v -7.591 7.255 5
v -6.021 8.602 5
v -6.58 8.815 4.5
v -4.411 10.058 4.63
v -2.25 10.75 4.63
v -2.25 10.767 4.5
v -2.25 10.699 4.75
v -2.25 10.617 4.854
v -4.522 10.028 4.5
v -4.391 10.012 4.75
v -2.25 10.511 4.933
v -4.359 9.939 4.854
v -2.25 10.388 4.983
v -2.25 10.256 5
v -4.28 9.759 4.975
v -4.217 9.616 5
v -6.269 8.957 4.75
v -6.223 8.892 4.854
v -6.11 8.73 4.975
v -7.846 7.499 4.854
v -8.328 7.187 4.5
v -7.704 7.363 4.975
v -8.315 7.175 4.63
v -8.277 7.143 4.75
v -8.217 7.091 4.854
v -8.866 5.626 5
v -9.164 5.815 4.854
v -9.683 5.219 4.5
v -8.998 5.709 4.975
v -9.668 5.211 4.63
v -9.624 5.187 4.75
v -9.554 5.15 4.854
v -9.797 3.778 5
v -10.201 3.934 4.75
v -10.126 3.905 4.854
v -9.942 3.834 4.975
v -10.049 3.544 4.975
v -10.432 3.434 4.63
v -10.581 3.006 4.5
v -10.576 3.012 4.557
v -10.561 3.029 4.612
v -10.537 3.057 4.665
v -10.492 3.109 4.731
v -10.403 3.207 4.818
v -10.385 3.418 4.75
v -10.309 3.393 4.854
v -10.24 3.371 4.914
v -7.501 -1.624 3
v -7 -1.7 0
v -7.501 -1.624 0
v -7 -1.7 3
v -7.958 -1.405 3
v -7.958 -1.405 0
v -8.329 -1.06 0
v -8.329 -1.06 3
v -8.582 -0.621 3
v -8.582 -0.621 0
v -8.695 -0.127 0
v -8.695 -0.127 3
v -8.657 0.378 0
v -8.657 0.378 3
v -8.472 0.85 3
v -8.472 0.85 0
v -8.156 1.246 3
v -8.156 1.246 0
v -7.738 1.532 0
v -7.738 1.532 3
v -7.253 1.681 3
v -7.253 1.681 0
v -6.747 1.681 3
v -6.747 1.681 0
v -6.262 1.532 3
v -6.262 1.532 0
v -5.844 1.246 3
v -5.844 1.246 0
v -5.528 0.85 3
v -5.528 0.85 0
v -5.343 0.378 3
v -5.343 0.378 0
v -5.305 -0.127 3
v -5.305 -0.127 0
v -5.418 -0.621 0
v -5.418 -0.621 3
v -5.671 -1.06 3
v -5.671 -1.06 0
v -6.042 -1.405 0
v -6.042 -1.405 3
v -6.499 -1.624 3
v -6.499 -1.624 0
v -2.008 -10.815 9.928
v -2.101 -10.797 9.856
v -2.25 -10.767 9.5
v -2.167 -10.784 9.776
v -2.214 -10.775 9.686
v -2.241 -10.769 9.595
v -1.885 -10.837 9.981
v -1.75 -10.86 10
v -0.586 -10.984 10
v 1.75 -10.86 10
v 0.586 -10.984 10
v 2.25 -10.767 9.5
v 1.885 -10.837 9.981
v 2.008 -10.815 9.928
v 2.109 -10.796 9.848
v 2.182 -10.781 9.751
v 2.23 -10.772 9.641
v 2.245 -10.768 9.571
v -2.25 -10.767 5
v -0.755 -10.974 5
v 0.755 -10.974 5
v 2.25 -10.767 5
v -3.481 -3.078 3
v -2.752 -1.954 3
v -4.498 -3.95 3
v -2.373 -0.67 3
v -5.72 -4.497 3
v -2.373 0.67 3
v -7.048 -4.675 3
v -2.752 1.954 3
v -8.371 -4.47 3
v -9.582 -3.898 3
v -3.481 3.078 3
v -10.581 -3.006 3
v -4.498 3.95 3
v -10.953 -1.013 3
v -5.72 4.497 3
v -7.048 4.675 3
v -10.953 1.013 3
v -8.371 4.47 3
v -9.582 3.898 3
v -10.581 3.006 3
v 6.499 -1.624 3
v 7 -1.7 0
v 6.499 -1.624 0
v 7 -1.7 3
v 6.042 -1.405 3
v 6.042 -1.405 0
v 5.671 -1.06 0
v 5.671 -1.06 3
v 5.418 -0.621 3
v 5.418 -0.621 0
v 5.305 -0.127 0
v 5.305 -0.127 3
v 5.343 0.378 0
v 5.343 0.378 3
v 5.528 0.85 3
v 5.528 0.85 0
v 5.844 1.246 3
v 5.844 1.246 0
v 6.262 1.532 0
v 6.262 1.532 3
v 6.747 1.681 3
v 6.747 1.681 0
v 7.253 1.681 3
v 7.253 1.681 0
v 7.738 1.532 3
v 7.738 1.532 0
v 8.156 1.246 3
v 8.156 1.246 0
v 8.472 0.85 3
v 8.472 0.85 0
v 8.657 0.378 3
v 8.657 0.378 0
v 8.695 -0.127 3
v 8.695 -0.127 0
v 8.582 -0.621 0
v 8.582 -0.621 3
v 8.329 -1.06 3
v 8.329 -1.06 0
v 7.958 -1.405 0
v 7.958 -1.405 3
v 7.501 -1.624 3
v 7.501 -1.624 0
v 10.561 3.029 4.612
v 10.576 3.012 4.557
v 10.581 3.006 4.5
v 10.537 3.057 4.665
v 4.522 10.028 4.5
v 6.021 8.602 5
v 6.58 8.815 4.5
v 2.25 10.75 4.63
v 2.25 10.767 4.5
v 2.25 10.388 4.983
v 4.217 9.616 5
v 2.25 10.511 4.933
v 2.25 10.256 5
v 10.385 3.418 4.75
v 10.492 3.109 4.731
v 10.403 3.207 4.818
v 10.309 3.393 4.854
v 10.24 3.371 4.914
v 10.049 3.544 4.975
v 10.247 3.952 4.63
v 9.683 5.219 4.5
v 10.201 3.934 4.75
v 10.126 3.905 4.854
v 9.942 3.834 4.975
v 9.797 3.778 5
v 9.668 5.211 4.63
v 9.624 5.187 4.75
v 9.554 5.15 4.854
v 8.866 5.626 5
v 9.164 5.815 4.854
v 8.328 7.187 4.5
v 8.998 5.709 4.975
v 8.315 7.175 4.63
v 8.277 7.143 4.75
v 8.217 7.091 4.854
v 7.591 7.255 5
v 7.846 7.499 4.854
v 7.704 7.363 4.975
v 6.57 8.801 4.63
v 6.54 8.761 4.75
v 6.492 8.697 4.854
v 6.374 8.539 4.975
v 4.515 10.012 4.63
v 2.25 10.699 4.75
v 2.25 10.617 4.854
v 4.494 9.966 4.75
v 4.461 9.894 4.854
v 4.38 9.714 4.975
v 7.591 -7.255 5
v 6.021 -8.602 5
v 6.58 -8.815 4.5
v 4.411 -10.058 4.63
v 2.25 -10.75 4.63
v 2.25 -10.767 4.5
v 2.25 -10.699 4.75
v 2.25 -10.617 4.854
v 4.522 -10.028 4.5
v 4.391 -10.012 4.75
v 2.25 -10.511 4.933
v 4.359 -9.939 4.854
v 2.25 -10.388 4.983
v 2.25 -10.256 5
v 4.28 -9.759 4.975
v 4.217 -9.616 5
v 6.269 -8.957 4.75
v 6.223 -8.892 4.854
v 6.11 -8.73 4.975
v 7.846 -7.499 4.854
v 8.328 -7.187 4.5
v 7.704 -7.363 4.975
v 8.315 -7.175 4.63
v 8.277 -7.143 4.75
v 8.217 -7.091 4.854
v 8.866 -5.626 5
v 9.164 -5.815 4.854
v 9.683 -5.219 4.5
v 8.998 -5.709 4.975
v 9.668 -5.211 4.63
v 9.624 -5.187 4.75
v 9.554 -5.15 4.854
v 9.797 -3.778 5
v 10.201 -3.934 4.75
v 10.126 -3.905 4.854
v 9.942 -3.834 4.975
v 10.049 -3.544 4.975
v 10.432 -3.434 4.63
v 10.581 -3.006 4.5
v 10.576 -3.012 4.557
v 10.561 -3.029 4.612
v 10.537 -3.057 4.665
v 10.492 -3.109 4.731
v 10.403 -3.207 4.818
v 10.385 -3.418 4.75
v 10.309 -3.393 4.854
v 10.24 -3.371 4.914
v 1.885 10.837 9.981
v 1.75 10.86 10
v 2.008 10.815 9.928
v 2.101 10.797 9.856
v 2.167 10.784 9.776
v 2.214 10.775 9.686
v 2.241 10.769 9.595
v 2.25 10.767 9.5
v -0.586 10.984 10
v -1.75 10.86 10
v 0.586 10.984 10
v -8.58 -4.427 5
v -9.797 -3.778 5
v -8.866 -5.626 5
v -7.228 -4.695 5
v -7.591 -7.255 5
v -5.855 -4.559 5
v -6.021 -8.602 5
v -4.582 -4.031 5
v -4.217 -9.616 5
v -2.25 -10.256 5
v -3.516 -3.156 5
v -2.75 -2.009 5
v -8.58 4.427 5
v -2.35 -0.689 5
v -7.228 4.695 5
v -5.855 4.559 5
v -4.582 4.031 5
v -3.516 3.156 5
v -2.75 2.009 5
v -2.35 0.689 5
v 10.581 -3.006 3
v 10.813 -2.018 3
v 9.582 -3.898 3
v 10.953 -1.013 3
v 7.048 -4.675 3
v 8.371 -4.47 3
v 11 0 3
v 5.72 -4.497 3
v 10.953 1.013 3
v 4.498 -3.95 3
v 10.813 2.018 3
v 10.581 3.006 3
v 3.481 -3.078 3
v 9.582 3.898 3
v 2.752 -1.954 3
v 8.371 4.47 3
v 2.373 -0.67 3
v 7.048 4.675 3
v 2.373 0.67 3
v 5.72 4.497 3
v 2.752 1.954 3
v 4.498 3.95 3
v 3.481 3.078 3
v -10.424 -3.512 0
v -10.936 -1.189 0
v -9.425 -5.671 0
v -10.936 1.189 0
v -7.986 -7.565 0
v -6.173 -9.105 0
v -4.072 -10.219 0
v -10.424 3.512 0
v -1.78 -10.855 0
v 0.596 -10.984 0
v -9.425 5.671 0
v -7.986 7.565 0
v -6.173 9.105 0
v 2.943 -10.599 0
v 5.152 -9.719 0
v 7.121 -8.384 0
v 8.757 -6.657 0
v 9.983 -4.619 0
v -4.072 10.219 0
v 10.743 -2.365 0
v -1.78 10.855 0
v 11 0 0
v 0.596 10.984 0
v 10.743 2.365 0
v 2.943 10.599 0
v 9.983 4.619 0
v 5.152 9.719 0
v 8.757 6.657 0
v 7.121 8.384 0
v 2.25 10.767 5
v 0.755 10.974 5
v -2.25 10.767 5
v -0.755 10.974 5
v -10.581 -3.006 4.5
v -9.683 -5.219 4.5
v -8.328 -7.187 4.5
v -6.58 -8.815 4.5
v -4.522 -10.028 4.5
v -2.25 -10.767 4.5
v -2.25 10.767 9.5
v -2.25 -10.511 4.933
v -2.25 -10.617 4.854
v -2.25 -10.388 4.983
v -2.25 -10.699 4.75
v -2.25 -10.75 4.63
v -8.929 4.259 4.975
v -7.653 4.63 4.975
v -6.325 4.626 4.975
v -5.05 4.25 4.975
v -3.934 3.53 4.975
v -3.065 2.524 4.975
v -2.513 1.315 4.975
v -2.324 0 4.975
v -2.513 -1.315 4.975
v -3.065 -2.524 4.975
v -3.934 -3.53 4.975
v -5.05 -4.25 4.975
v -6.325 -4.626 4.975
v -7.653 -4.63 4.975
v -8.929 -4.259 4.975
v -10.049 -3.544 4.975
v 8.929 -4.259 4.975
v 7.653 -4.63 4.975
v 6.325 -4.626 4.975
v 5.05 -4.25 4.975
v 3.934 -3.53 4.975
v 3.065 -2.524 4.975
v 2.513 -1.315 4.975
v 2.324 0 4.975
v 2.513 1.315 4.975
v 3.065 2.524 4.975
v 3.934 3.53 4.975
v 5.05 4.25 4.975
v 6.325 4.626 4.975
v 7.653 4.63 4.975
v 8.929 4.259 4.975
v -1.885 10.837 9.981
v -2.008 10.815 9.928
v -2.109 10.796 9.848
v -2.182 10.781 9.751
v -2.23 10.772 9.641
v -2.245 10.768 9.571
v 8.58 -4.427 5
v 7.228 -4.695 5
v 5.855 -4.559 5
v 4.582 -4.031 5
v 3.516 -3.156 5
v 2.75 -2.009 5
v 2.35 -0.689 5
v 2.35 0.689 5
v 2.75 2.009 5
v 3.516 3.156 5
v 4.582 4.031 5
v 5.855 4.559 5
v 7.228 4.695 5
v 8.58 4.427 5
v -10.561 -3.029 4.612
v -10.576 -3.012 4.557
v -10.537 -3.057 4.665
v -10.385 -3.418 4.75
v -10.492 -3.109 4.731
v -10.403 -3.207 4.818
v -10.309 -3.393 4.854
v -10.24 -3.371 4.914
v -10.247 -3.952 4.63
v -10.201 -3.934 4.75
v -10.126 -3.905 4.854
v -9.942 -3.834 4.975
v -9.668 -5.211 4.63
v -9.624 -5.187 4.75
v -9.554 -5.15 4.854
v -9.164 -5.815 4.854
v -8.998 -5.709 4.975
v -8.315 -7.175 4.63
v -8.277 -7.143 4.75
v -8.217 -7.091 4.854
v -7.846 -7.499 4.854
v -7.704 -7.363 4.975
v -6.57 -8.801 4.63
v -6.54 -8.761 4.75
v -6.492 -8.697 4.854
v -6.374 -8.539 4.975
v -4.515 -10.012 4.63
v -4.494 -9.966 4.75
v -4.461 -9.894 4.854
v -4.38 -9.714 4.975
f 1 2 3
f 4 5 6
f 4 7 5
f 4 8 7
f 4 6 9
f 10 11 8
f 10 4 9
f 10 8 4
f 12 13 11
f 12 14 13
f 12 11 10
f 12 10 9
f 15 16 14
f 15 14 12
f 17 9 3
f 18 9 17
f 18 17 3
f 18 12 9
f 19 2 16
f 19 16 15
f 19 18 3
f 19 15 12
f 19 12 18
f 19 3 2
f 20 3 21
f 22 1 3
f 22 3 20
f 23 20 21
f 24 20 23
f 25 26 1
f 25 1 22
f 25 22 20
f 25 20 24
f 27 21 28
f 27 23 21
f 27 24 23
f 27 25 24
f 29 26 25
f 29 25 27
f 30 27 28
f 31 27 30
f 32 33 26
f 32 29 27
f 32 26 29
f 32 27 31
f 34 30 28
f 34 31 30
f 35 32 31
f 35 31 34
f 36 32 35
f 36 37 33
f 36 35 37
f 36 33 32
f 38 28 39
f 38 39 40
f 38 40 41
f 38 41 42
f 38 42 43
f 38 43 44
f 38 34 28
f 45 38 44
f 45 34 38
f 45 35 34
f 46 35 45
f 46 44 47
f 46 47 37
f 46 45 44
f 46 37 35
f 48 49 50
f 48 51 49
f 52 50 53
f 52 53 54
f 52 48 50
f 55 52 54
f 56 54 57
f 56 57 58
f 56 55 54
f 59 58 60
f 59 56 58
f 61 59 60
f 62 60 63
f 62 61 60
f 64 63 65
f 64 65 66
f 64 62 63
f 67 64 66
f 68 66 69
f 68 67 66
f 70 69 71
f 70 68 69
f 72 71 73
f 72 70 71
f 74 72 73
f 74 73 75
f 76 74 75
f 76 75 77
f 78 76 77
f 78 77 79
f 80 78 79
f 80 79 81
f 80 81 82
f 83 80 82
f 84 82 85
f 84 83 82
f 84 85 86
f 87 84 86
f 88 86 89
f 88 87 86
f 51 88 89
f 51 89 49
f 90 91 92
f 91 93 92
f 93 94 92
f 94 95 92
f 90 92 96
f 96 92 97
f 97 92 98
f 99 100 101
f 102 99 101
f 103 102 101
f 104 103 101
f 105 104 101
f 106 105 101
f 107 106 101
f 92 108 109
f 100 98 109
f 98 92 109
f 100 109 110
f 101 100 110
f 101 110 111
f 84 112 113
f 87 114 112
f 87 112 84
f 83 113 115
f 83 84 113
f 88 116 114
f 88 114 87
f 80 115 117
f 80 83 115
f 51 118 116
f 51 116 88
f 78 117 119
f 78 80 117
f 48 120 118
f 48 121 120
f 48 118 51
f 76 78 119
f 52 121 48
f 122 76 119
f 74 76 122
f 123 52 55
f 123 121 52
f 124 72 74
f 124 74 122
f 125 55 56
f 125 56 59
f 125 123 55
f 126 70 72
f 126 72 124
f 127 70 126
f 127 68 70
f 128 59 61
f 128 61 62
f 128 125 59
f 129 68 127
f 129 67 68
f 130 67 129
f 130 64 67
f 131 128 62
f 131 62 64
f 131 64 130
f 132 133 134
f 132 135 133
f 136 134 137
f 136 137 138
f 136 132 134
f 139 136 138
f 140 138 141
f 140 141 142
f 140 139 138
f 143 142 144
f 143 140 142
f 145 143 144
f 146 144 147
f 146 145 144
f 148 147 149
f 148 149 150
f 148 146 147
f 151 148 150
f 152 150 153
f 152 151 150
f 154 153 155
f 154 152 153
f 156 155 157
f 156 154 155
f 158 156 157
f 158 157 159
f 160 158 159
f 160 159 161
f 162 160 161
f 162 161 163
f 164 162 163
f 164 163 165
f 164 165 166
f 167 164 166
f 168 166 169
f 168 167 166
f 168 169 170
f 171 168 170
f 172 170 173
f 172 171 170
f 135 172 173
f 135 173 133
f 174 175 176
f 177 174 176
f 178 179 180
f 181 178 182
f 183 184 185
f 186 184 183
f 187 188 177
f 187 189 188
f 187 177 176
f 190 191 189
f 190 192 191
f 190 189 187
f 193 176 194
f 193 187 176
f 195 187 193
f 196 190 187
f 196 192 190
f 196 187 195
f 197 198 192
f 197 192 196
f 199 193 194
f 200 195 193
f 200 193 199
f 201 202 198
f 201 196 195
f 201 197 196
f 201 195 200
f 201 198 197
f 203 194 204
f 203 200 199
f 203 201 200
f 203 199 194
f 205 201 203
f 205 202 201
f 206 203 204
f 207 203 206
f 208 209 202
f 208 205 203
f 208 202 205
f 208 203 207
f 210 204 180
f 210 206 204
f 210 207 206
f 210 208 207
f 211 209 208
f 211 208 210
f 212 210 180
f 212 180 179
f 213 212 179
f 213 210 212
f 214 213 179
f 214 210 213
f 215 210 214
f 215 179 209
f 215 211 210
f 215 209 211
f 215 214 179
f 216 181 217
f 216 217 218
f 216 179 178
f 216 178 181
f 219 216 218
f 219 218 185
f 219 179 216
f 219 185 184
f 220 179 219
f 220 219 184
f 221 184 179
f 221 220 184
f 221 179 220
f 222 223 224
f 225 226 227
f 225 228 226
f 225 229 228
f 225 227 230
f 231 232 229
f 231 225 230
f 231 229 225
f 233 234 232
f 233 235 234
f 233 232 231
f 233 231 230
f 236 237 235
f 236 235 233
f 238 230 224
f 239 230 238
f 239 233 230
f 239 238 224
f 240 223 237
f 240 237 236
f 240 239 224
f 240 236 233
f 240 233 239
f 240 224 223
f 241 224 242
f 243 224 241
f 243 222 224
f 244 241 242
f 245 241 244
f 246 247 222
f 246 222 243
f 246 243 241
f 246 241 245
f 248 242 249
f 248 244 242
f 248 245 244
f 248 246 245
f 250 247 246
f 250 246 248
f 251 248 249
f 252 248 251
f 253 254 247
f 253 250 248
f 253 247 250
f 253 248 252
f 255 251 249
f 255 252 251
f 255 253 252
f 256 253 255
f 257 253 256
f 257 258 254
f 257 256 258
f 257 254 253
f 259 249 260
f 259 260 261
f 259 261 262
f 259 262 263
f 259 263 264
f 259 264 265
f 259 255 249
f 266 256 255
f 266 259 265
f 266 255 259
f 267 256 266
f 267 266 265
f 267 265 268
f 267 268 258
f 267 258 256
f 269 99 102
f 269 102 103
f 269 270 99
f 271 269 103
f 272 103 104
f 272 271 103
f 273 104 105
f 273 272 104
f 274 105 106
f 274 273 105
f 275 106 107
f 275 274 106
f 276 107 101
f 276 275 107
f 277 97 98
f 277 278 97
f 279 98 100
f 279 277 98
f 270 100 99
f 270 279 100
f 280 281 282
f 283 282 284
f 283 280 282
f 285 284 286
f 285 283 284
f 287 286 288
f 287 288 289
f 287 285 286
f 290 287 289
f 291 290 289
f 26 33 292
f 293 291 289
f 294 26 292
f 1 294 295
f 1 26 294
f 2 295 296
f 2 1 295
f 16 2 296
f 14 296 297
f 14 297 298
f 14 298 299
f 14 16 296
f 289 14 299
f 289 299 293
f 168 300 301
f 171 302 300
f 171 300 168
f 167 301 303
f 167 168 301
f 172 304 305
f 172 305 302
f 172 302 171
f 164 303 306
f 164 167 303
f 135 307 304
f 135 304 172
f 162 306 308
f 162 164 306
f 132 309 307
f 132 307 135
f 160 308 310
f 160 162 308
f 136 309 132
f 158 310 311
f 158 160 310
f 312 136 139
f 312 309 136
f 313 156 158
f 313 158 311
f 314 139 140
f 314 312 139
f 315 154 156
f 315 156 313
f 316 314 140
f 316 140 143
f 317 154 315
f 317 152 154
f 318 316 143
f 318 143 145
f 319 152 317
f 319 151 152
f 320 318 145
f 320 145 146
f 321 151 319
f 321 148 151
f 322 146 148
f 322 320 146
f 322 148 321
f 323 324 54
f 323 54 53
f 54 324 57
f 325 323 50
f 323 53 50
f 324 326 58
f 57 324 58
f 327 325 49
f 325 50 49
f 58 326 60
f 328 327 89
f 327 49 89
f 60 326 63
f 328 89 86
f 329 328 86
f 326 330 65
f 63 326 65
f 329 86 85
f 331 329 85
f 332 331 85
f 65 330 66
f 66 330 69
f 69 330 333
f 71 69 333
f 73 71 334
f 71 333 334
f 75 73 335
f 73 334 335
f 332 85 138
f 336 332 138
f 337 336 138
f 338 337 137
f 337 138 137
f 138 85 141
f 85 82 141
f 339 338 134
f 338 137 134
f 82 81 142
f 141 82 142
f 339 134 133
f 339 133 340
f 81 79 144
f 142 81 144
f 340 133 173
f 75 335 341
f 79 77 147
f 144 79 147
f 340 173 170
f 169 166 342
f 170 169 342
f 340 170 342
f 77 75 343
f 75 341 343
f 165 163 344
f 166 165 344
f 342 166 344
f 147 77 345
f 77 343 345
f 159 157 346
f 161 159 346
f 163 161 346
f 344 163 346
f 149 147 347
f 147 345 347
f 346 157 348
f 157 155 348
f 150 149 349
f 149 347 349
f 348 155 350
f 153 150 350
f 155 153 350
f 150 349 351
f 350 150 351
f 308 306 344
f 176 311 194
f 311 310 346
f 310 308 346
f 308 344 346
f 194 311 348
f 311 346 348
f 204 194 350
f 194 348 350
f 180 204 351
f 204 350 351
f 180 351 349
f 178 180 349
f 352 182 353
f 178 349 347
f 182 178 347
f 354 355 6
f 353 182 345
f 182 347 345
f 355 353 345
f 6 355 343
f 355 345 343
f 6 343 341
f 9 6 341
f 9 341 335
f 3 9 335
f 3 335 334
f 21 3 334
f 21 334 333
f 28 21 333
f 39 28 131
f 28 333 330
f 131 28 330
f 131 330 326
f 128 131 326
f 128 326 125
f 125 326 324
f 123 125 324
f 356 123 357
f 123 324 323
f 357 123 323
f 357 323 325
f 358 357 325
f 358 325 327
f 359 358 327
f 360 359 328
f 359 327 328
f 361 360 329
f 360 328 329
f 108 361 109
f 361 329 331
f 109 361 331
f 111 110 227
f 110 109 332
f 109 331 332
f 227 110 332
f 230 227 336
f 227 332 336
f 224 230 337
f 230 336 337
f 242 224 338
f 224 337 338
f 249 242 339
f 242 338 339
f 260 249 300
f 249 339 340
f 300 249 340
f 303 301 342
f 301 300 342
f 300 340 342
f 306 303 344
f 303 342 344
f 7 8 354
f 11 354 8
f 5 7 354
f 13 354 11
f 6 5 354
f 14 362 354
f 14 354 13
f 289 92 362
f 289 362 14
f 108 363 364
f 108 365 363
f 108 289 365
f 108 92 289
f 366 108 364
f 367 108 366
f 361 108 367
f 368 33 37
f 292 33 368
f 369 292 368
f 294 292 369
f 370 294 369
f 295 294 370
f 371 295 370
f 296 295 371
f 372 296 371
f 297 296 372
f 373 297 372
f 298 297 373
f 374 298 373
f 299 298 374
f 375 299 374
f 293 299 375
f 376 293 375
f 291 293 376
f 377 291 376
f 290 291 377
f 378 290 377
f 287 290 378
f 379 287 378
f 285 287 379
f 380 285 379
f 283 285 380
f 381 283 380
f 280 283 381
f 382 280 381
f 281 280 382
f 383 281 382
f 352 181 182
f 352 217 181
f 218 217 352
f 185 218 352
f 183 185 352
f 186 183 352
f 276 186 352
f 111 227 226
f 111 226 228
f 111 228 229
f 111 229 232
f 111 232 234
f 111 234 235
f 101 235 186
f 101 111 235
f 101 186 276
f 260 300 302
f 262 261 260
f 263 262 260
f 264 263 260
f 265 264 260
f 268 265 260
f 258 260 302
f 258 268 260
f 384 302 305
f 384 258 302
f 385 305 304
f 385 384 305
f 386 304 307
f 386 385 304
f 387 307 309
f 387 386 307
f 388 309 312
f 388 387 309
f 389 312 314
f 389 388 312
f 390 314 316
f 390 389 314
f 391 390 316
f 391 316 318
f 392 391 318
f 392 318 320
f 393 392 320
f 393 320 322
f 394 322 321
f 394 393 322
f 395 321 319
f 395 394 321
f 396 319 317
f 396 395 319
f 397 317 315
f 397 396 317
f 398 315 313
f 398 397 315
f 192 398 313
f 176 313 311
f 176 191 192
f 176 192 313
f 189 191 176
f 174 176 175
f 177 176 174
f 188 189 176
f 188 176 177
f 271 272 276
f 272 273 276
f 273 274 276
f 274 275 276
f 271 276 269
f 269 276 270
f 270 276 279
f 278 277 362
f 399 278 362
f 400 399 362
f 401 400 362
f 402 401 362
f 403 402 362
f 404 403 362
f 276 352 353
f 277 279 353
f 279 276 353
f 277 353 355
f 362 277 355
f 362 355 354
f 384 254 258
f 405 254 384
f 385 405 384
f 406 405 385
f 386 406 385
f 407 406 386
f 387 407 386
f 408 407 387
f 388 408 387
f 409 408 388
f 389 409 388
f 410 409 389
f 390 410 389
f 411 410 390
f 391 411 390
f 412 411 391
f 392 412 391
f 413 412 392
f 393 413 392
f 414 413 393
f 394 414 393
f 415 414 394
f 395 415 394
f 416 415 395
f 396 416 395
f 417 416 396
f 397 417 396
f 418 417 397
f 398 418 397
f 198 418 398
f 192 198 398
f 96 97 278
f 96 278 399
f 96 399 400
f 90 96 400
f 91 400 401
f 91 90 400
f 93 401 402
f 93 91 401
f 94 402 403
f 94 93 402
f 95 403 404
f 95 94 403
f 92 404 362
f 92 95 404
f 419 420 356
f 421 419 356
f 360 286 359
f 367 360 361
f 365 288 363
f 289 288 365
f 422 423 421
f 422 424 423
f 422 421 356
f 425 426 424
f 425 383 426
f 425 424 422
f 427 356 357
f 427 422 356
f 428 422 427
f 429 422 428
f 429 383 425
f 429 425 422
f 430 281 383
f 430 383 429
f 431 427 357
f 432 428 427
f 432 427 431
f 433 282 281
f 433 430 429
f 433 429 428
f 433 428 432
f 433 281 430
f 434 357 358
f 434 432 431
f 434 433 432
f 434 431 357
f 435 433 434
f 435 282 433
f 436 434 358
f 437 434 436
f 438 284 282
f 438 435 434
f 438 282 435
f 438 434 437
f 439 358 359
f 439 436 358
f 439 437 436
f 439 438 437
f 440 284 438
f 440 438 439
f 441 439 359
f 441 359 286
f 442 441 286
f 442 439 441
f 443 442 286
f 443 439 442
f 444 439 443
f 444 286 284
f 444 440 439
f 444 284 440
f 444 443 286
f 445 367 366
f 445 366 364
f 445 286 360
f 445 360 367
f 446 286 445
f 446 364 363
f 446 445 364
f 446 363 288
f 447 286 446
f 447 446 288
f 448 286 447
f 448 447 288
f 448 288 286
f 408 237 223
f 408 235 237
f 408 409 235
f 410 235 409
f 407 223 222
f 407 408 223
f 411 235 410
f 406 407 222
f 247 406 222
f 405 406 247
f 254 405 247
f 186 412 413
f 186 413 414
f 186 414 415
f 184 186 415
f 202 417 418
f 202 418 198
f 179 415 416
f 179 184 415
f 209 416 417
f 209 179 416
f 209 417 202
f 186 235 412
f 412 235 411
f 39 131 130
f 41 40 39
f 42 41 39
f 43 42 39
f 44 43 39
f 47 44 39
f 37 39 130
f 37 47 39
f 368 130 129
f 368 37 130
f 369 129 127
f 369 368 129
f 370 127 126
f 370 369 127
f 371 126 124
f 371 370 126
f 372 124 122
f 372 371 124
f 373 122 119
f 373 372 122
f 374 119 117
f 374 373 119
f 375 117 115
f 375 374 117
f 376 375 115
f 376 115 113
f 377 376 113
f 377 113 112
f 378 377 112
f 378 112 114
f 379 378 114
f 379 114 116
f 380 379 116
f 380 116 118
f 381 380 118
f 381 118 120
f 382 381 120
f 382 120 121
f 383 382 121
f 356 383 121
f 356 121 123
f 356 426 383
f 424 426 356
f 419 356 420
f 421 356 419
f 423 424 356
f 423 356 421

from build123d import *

# Parameters (mm, degrees)
ESQUISSE1_R                                = 11
BOSS_EXTRU_1_DEPTH                         = 5
BOSS_EXTRU_2_DEPTH                         = 5
CONG_1_R                                   = 0.5
CONG_2_R                                   = 0.5
CHAMBRAGE_POUR_VIS_T_TE_HEXAGONALE_2_COUNT = 2
CHAMBRAGE_POUR_VIS_T_TE_HEXAGONALE_2_PITCH = 14


with BuildPart() as part:
    # Esquisse1 → Boss.-Extru.1 (new body)
    with BuildSketch(Plane.XY):
        Circle(ESQUISSE1_R)
    extrude(amount=BOSS_EXTRU_1_DEPTH)

    # Esquisse2 → Boss.-Extru.2 (add)
    with BuildSketch(Plane.XY.offset(5)):
        with BuildLine():
            Line((-2.25, 10.767427734), (-2.25, -10.767427734))
            ThreePointArc((-2.25, -10.767427734), (0, -11), (2.25, -10.767427734))
            Line((2.25, -10.767427734), (2.25, 10.767427734))
            ThreePointArc((2.25, 10.767427734), (0, 11), (-2.25, 10.767427734))
        make_face()
    extrude(amount=BOSS_EXTRU_2_DEPTH)

    # Congé1
    # the kernel refuses this fillet: 0.5 mm, written as the material it takes off along each edge
    with BuildSketch(Plane(origin=(0, 0, 5), x_dir=(1, 0, 0), z_dir=(0, -1, 0))) as cong_1_piece_1_section:
        with BuildLine():
            CenterArc((11 - CONG_1_R, -CONG_1_R), CONG_1_R, 0, 90)
            Line((11 - CONG_1_R, 0), (11, 0))
            Line((11, 0), (11, -CONG_1_R))
        make_face()
    cong_1_piece_1 = revolve(axis=Axis((0, 0, 5), (0, 0, 1)), revolution_arc=84.709966663, mode=Mode.PRIVATE)
    cong_1_piece_1 = split(cong_1_piece_1, bisect_by=Plane(origin=(2.25, 6.849238197, 4.860494097), z_dir=(1, 0, 0)), keep=Keep.TOP, mode=Mode.PRIVATE)
    add(cong_1_piece_1, mode=Mode.SUBTRACT)
    with BuildSketch(Plane(origin=(0, 0, 5), x_dir=(-0.09209435598591774, 0.9957502847579502, 0), z_dir=(0.9957502847579502, 0.09209435598591774, 0))) as cong_1_piece_2_section:
        with BuildLine():
            CenterArc((11 - CONG_1_R, -CONG_1_R), CONG_1_R, 0, 90)
            Line((11 - CONG_1_R, 0), (11, 0))
            Line((11, 0), (11, -CONG_1_R))
        make_face()
    cong_1_piece_2 = revolve(axis=Axis((0, 0, 5), (0, 0, 1)), revolution_arc=169.431789296, mode=Mode.PRIVATE)
    cong_1_piece_2 = split(cong_1_piece_2, bisect_by=Plane(origin=(-2.25, 0, 4.86229808), z_dir=(-1, 0, 0)), keep=Keep.TOP, mode=Mode.PRIVATE)
    add(cong_1_piece_2, mode=Mode.SUBTRACT)
    with BuildSketch(Plane(origin=(0, 0, 5), x_dir=(0.09219737865829941, -0.9957407510836032, 0), z_dir=(-0.9957407510836032, -0.09219737865829941, 0))) as cong_1_piece_3_section:
        with BuildLine():
            CenterArc((11 - CONG_1_R, -CONG_1_R), CONG_1_R, 0, 90)
            Line((11 - CONG_1_R, 0), (11, 0))
            Line((11, 0), (11, -CONG_1_R))
        make_face()
    cong_1_piece_3 = revolve(axis=Axis((0, 0, 5), (0, 0, 1)), revolution_arc=84.709966663, mode=Mode.PRIVATE)
    cong_1_piece_3 = split(cong_1_piece_3, bisect_by=Plane(origin=(2.25, -6.849238209, 4.860494116), z_dir=(1, 0, 0)), keep=Keep.TOP, mode=Mode.PRIVATE)
    add(cong_1_piece_3, mode=Mode.SUBTRACT)

    # Congé2
    cong_2_edges = [part.edges().sort_by_distance(p)[0] for p in [
        (-2.25, 0, 10),
        (2.25, 0, 10),
    ]]
    fillet(cong_2_edges, radius=CONG_2_R)

    # Esquisse4 → Chambrage pour vis à tête hexagonale M31 (revolve, cut)
    with BuildSketch(Plane(origin=(-7, 0, 5), x_dir=(0, -1, 0), z_dir=(1, 0, 0))):
        Polygon((0, 0), (0, 5), (1.7, 5), (1.7, 2), (4.6755, 2), (4.6755, 0.025), (4.7005, 0), align=None)
    chambrage_pour_vis_t_te_hexagonale_m31 = revolve(axis=Axis((-7, 0, 11.35), (0, 0, -1)), mode=Mode.SUBTRACT)

    # Chambrage pour vis _ t_te hexagonale 2: Chambrage pour vis à tête hexagonale M31 ×2
    with Locations(*[(i * CHAMBRAGE_POUR_VIS_T_TE_HEXAGONALE_2_PITCH, 0, 0) for i in range(1, CHAMBRAGE_POUR_VIS_T_TE_HEXAGONALE_2_COUNT)]):
        add(chambrage_pour_vis_t_te_hexagonale_m31, mode=Mode.SUBTRACT)


solid = part.part
